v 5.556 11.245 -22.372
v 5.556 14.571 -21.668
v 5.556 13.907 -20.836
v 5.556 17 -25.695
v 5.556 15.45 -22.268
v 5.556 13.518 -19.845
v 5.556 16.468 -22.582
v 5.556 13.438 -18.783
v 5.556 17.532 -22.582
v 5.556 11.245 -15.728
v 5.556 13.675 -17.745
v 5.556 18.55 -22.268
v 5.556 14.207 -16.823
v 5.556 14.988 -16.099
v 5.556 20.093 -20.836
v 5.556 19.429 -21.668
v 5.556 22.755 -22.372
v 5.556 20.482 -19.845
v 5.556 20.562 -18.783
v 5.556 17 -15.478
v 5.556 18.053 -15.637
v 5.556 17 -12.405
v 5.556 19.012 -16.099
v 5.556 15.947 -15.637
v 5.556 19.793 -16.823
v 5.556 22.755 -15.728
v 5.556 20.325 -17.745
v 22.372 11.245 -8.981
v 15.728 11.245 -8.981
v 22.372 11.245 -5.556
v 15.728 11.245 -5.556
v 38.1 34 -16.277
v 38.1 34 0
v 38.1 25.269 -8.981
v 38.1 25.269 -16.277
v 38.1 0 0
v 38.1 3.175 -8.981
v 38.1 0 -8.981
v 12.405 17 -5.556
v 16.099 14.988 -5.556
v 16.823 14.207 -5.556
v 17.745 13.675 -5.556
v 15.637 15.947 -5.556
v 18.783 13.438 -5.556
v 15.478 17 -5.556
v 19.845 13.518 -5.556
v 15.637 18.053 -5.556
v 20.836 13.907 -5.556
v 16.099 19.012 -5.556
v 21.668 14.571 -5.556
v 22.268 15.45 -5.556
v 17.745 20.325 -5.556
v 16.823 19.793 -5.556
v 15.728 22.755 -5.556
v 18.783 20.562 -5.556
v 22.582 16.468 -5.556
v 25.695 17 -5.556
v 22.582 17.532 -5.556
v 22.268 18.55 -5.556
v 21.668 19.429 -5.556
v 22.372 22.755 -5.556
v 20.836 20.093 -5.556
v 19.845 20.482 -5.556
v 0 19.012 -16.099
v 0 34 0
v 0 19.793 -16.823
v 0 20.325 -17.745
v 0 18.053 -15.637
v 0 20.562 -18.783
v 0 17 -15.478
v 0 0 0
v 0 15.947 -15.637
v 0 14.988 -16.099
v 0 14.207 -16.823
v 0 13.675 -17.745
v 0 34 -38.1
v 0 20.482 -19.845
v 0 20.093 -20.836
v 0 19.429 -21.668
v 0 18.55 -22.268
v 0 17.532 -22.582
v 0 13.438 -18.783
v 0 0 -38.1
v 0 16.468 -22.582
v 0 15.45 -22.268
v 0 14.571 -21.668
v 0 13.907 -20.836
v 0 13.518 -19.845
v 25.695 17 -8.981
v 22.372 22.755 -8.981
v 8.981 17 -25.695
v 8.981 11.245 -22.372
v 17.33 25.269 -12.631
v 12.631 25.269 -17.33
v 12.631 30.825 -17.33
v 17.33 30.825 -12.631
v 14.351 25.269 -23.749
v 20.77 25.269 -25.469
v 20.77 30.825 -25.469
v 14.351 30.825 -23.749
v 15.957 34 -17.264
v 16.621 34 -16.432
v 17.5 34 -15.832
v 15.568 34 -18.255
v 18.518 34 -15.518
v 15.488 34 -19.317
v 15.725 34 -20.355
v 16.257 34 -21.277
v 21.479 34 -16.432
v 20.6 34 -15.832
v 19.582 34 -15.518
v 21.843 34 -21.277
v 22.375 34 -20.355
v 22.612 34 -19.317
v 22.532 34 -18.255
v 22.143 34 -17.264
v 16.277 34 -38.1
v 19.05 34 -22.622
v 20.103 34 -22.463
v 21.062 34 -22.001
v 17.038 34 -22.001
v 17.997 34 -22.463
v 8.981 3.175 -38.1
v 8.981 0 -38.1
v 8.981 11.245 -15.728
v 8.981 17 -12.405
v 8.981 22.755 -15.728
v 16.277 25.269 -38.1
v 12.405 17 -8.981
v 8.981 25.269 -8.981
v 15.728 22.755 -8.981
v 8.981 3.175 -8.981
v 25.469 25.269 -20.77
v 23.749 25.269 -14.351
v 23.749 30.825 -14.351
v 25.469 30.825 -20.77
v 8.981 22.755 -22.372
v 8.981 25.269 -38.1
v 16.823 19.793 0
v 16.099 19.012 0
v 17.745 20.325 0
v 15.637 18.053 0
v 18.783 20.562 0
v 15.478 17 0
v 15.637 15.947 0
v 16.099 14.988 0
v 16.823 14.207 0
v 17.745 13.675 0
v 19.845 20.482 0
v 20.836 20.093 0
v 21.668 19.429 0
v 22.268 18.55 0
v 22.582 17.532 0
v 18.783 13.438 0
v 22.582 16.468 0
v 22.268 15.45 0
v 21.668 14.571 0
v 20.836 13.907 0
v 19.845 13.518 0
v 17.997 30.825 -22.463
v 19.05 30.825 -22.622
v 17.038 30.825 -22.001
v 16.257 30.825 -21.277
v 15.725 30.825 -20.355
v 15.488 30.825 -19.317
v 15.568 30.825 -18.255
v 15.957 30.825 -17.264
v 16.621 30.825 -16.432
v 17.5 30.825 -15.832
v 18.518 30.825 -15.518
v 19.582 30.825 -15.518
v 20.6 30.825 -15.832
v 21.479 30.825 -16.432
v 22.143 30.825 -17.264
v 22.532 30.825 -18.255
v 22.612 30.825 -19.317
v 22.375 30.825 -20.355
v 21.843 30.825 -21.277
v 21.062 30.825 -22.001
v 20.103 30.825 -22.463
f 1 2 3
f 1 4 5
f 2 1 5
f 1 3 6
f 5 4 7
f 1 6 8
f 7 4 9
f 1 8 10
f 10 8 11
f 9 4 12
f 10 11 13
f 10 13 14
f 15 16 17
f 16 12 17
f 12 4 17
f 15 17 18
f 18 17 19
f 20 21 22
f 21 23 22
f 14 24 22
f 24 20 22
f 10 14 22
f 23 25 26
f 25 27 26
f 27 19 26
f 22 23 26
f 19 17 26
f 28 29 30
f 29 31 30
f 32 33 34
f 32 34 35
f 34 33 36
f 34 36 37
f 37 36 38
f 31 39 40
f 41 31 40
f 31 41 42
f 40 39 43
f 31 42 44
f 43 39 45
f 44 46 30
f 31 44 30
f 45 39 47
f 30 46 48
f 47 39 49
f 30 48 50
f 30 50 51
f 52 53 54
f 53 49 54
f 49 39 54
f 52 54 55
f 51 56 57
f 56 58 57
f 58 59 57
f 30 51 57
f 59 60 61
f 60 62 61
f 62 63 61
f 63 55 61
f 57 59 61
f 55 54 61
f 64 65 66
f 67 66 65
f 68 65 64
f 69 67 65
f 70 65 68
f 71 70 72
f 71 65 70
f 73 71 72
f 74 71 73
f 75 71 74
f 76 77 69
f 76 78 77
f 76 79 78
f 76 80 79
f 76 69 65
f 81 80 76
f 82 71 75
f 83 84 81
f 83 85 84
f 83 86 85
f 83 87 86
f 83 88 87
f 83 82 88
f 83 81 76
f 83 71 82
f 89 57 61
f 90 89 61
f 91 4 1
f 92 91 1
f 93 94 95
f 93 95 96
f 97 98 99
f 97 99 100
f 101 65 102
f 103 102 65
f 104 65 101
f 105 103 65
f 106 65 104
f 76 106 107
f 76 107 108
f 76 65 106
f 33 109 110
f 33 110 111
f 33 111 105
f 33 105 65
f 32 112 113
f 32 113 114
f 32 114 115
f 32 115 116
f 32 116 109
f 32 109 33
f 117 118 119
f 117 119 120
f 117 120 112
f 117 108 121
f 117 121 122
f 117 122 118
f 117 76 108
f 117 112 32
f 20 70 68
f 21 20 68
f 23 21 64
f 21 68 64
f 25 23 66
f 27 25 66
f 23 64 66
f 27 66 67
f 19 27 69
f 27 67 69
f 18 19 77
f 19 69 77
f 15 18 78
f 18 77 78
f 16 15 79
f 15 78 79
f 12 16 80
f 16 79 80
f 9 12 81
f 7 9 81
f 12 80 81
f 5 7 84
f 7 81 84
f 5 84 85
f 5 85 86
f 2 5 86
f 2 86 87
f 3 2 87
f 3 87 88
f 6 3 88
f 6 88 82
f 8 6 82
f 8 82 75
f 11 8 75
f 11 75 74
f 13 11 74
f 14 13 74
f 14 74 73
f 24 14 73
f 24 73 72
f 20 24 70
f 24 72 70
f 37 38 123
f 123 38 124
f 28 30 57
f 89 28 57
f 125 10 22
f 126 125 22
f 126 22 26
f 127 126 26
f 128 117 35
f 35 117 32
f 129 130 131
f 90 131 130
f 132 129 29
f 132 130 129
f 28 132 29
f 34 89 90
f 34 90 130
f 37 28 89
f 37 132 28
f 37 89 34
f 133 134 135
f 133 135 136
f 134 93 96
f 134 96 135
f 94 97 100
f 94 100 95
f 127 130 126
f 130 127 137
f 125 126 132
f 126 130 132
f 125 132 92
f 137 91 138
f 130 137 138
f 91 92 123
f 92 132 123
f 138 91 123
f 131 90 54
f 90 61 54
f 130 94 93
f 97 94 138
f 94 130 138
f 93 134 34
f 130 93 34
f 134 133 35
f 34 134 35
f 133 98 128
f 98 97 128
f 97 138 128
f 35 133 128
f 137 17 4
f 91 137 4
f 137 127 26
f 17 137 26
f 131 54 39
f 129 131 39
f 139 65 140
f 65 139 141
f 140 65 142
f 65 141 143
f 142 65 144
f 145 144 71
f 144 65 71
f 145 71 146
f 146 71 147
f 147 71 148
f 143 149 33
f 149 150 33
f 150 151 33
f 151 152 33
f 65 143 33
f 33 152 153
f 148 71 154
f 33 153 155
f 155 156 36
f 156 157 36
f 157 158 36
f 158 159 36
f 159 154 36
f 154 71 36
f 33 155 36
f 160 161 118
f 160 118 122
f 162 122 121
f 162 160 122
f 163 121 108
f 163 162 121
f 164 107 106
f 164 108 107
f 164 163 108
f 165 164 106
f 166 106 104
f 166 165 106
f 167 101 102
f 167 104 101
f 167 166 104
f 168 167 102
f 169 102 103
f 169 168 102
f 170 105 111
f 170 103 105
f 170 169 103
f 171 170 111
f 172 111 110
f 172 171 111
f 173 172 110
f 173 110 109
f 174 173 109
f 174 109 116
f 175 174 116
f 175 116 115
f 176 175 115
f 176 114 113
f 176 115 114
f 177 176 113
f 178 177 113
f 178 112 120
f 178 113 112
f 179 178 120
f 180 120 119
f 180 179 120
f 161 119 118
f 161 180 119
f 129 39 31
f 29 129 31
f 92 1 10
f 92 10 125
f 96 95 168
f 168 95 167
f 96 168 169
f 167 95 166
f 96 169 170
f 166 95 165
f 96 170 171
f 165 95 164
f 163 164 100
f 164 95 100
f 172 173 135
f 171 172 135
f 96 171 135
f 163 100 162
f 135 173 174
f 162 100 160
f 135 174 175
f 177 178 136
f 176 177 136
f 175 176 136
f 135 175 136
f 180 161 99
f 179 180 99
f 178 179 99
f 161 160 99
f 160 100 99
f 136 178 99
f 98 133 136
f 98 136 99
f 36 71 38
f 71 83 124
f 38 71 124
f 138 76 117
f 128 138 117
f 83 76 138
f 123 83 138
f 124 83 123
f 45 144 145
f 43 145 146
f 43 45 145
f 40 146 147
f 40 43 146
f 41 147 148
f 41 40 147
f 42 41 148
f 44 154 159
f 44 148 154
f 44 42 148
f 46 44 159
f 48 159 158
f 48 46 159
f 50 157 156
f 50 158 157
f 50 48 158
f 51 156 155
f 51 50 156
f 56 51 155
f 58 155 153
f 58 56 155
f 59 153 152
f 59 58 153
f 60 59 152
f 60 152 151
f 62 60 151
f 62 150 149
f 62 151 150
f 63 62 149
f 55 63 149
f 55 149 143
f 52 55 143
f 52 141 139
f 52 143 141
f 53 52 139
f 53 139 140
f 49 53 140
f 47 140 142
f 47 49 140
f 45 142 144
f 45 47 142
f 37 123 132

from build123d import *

# Parameters (mm, degrees)
SKETCH1_W                    = 38.1
SKETCH1_H                    = 38.1
MAIN_BODY_DEPTH              = 34
F_9_32_RIGHT_RAIL_DEPTH      = 64.712008287
F_9_32_RIGHT_RAIL_DEPTH_BACK = 5.55625
SKETCH3_R                    = 3.571875
SKETCH4_R                    = 3.571875
F_9_32_LEFT_RAIL_DEPTH       = 5.55625
F_9_32_TOPPER_DEPTH          = 64.712008287
F_9_32_TOPPER_DEPTH_BACK     = 10
SKETCH8_R                    = 3.571875
CUT_EXTRUDE3_START           = -5.55625
CUT_EXTRUDE3_DEPTH           = 32.54375
CUT_EXTRUDE4_START           = -5.55625
CUT_EXTRUDE4_DEPTH           = 32.54375
CUT_EXTRUDE12_START          = -30.825
CUT_EXTRUDE12_OUTLINE_W      = 29.119345377
CUT_EXTRUDE12_OUTLINE_H      = 29.119345377
CUT_EXTRUDE12_DEPTH          = 22.09375
CUT_EXTRUDE15_START          = -17
CUT_EXTRUDE15_DEPTH          = 13.825
CUT_EXTRUDE16_REACH          = 65.712
CUT_EXTRUDE17_REACH          = 65.712


# Read off the part's stored shape, not the designer's step: Cut-Extrude12
with BuildPart() as part:
    # Sketch1 → Main Body (new body)
    with BuildSketch(Plane(origin=(0, 0, 0), x_dir=(1, 0, 0), z_dir=(0, 1, 0))):
        with Locations((19.05, 19.05)):
            Rectangle(SKETCH1_W, SKETCH1_H)
    extrude(amount=MAIN_BODY_DEPTH)

    # Sketch3 → 9/32 Right Rail (cut, two sides: drawn at the far end of the back side and taken through both)
    with BuildSketch(Plane.XY.offset(-F_9_32_RIGHT_RAIL_DEPTH_BACK)):
        with Locations(Location((19.05, 17, 0), (0, 0, 180))):
            Circle(SKETCH3_R)
    extrude(amount=F_9_32_RIGHT_RAIL_DEPTH + F_9_32_RIGHT_RAIL_DEPTH_BACK, mode=Mode.SUBTRACT)

    # Sketch4 → 9/32 Left Rail (cut)
    with BuildSketch(Plane.ZY):
        with Locations((-19.05, 17)):
            Circle(SKETCH4_R)
    extrude(amount=-F_9_32_LEFT_RAIL_DEPTH, mode=Mode.SUBTRACT)

    # Sketch8 → 9/32 Topper (cut, two sides: drawn at the far end of the back side and taken through both)
    with BuildSketch(Plane(origin=(0, 34, 0), x_dir=(1, 0, 0), z_dir=(0, 1, 0)).offset(-F_9_32_TOPPER_DEPTH_BACK)):
        with Locations(Location((19.05, 19.05, 0), (0, 0, 90))):
            Circle(SKETCH8_R)
    extrude(amount=F_9_32_TOPPER_DEPTH + F_9_32_TOPPER_DEPTH_BACK, mode=Mode.SUBTRACT)

    # Sketch9 → Cut-Extrude3 (cut)
    with BuildSketch(Plane.ZY.offset(CUT_EXTRUDE3_START)):
        Polygon((-22.372470377, 22.7546875), (-25.694940754, 17), (-22.372470377, 11.2453125), (-15.727529623, 11.2453125), (-12.405059246, 17), (-15.727529623, 22.7546875), align=None)
    extrude(amount=-CUT_EXTRUDE3_DEPTH, mode=Mode.SUBTRACT)

    # Sketch10 → Cut-Extrude4 (cut)
    with BuildSketch(Plane.XY.offset(CUT_EXTRUDE4_START)):
        Polygon((15.727529623, 22.7546875), (12.405059246, 17), (15.727529623, 11.2453125), (22.372470377, 11.2453125), (25.694940754, 17), (22.372470377, 22.7546875), align=None)
    extrude(amount=-CUT_EXTRUDE4_DEPTH, mode=Mode.SUBTRACT)

    # Cut-Extrude12 outline → Cut-Extrude12 (cut)
    with BuildSketch(Plane(origin=(0, 34, 0), x_dir=(1, 0, 0), z_dir=(0, 1, 0)).offset(CUT_EXTRUDE12_START)):
        with Locations((23.540327312, 23.540327312)):
            Rectangle(CUT_EXTRUDE12_OUTLINE_W, CUT_EXTRUDE12_OUTLINE_H)
    extrude(amount=CUT_EXTRUDE12_DEPTH, mode=Mode.SUBTRACT)

    # Sketch14 → Cut-Extrude15 (cut)
    with BuildSketch(Plane(origin=(0, 34, 0), x_dir=(1, 0, 0), z_dir=(0, 1, 0)).offset(CUT_EXTRUDE15_START)):
        Polygon((23.748682668, 14.351317332), (25.468519889, 20.769837221), (20.769837221, 25.468519889), (14.351317332, 23.748682668), (12.631480111, 17.330162779), (17.330162779, 12.631480111), align=None)
    extrude(amount=CUT_EXTRUDE15_DEPTH, mode=Mode.SUBTRACT)

    # Sketch15 → Cut-Extrude16 (cut, up to next)
    with BuildSketch(Plane.XZ, mode=Mode.PRIVATE) as cut_extrude16_sk1:
        Polygon((38.1, -8.980654623), (8.980654623, -38.1), (38.1, -38.1), align=None)
    cut_extrude16_tool1 = extrude(cut_extrude16_sk1.sketch, amount=-CUT_EXTRUDE16_REACH, mode=Mode.PRIVATE) & part.part
    add(cut_extrude16_tool1.solids().sort_by_distance((28.393552, 0, -28.393552))[0], mode=Mode.SUBTRACT)

    # Sketch16 → Cut-Extrude17 (cut, up to next)
    with BuildSketch(Plane(origin=(0, 34, 0), x_dir=(1, 0, 0), z_dir=(0, 1, 0)), mode=Mode.PRIVATE) as cut_extrude17_sk1:
        Polygon((38.1, 38.1), (16.276714219, 38.1), (38.1, 16.276714219), align=None)
    cut_extrude17_tool1 = extrude(cut_extrude17_sk1.sketch, amount=-CUT_EXTRUDE17_REACH, mode=Mode.PRIVATE) & part.part
    add(cut_extrude17_tool1.solids().sort_by_distance((30.825571, 34, -30.825571))[0], mode=Mode.SUBTRACT)


solid = part.part
